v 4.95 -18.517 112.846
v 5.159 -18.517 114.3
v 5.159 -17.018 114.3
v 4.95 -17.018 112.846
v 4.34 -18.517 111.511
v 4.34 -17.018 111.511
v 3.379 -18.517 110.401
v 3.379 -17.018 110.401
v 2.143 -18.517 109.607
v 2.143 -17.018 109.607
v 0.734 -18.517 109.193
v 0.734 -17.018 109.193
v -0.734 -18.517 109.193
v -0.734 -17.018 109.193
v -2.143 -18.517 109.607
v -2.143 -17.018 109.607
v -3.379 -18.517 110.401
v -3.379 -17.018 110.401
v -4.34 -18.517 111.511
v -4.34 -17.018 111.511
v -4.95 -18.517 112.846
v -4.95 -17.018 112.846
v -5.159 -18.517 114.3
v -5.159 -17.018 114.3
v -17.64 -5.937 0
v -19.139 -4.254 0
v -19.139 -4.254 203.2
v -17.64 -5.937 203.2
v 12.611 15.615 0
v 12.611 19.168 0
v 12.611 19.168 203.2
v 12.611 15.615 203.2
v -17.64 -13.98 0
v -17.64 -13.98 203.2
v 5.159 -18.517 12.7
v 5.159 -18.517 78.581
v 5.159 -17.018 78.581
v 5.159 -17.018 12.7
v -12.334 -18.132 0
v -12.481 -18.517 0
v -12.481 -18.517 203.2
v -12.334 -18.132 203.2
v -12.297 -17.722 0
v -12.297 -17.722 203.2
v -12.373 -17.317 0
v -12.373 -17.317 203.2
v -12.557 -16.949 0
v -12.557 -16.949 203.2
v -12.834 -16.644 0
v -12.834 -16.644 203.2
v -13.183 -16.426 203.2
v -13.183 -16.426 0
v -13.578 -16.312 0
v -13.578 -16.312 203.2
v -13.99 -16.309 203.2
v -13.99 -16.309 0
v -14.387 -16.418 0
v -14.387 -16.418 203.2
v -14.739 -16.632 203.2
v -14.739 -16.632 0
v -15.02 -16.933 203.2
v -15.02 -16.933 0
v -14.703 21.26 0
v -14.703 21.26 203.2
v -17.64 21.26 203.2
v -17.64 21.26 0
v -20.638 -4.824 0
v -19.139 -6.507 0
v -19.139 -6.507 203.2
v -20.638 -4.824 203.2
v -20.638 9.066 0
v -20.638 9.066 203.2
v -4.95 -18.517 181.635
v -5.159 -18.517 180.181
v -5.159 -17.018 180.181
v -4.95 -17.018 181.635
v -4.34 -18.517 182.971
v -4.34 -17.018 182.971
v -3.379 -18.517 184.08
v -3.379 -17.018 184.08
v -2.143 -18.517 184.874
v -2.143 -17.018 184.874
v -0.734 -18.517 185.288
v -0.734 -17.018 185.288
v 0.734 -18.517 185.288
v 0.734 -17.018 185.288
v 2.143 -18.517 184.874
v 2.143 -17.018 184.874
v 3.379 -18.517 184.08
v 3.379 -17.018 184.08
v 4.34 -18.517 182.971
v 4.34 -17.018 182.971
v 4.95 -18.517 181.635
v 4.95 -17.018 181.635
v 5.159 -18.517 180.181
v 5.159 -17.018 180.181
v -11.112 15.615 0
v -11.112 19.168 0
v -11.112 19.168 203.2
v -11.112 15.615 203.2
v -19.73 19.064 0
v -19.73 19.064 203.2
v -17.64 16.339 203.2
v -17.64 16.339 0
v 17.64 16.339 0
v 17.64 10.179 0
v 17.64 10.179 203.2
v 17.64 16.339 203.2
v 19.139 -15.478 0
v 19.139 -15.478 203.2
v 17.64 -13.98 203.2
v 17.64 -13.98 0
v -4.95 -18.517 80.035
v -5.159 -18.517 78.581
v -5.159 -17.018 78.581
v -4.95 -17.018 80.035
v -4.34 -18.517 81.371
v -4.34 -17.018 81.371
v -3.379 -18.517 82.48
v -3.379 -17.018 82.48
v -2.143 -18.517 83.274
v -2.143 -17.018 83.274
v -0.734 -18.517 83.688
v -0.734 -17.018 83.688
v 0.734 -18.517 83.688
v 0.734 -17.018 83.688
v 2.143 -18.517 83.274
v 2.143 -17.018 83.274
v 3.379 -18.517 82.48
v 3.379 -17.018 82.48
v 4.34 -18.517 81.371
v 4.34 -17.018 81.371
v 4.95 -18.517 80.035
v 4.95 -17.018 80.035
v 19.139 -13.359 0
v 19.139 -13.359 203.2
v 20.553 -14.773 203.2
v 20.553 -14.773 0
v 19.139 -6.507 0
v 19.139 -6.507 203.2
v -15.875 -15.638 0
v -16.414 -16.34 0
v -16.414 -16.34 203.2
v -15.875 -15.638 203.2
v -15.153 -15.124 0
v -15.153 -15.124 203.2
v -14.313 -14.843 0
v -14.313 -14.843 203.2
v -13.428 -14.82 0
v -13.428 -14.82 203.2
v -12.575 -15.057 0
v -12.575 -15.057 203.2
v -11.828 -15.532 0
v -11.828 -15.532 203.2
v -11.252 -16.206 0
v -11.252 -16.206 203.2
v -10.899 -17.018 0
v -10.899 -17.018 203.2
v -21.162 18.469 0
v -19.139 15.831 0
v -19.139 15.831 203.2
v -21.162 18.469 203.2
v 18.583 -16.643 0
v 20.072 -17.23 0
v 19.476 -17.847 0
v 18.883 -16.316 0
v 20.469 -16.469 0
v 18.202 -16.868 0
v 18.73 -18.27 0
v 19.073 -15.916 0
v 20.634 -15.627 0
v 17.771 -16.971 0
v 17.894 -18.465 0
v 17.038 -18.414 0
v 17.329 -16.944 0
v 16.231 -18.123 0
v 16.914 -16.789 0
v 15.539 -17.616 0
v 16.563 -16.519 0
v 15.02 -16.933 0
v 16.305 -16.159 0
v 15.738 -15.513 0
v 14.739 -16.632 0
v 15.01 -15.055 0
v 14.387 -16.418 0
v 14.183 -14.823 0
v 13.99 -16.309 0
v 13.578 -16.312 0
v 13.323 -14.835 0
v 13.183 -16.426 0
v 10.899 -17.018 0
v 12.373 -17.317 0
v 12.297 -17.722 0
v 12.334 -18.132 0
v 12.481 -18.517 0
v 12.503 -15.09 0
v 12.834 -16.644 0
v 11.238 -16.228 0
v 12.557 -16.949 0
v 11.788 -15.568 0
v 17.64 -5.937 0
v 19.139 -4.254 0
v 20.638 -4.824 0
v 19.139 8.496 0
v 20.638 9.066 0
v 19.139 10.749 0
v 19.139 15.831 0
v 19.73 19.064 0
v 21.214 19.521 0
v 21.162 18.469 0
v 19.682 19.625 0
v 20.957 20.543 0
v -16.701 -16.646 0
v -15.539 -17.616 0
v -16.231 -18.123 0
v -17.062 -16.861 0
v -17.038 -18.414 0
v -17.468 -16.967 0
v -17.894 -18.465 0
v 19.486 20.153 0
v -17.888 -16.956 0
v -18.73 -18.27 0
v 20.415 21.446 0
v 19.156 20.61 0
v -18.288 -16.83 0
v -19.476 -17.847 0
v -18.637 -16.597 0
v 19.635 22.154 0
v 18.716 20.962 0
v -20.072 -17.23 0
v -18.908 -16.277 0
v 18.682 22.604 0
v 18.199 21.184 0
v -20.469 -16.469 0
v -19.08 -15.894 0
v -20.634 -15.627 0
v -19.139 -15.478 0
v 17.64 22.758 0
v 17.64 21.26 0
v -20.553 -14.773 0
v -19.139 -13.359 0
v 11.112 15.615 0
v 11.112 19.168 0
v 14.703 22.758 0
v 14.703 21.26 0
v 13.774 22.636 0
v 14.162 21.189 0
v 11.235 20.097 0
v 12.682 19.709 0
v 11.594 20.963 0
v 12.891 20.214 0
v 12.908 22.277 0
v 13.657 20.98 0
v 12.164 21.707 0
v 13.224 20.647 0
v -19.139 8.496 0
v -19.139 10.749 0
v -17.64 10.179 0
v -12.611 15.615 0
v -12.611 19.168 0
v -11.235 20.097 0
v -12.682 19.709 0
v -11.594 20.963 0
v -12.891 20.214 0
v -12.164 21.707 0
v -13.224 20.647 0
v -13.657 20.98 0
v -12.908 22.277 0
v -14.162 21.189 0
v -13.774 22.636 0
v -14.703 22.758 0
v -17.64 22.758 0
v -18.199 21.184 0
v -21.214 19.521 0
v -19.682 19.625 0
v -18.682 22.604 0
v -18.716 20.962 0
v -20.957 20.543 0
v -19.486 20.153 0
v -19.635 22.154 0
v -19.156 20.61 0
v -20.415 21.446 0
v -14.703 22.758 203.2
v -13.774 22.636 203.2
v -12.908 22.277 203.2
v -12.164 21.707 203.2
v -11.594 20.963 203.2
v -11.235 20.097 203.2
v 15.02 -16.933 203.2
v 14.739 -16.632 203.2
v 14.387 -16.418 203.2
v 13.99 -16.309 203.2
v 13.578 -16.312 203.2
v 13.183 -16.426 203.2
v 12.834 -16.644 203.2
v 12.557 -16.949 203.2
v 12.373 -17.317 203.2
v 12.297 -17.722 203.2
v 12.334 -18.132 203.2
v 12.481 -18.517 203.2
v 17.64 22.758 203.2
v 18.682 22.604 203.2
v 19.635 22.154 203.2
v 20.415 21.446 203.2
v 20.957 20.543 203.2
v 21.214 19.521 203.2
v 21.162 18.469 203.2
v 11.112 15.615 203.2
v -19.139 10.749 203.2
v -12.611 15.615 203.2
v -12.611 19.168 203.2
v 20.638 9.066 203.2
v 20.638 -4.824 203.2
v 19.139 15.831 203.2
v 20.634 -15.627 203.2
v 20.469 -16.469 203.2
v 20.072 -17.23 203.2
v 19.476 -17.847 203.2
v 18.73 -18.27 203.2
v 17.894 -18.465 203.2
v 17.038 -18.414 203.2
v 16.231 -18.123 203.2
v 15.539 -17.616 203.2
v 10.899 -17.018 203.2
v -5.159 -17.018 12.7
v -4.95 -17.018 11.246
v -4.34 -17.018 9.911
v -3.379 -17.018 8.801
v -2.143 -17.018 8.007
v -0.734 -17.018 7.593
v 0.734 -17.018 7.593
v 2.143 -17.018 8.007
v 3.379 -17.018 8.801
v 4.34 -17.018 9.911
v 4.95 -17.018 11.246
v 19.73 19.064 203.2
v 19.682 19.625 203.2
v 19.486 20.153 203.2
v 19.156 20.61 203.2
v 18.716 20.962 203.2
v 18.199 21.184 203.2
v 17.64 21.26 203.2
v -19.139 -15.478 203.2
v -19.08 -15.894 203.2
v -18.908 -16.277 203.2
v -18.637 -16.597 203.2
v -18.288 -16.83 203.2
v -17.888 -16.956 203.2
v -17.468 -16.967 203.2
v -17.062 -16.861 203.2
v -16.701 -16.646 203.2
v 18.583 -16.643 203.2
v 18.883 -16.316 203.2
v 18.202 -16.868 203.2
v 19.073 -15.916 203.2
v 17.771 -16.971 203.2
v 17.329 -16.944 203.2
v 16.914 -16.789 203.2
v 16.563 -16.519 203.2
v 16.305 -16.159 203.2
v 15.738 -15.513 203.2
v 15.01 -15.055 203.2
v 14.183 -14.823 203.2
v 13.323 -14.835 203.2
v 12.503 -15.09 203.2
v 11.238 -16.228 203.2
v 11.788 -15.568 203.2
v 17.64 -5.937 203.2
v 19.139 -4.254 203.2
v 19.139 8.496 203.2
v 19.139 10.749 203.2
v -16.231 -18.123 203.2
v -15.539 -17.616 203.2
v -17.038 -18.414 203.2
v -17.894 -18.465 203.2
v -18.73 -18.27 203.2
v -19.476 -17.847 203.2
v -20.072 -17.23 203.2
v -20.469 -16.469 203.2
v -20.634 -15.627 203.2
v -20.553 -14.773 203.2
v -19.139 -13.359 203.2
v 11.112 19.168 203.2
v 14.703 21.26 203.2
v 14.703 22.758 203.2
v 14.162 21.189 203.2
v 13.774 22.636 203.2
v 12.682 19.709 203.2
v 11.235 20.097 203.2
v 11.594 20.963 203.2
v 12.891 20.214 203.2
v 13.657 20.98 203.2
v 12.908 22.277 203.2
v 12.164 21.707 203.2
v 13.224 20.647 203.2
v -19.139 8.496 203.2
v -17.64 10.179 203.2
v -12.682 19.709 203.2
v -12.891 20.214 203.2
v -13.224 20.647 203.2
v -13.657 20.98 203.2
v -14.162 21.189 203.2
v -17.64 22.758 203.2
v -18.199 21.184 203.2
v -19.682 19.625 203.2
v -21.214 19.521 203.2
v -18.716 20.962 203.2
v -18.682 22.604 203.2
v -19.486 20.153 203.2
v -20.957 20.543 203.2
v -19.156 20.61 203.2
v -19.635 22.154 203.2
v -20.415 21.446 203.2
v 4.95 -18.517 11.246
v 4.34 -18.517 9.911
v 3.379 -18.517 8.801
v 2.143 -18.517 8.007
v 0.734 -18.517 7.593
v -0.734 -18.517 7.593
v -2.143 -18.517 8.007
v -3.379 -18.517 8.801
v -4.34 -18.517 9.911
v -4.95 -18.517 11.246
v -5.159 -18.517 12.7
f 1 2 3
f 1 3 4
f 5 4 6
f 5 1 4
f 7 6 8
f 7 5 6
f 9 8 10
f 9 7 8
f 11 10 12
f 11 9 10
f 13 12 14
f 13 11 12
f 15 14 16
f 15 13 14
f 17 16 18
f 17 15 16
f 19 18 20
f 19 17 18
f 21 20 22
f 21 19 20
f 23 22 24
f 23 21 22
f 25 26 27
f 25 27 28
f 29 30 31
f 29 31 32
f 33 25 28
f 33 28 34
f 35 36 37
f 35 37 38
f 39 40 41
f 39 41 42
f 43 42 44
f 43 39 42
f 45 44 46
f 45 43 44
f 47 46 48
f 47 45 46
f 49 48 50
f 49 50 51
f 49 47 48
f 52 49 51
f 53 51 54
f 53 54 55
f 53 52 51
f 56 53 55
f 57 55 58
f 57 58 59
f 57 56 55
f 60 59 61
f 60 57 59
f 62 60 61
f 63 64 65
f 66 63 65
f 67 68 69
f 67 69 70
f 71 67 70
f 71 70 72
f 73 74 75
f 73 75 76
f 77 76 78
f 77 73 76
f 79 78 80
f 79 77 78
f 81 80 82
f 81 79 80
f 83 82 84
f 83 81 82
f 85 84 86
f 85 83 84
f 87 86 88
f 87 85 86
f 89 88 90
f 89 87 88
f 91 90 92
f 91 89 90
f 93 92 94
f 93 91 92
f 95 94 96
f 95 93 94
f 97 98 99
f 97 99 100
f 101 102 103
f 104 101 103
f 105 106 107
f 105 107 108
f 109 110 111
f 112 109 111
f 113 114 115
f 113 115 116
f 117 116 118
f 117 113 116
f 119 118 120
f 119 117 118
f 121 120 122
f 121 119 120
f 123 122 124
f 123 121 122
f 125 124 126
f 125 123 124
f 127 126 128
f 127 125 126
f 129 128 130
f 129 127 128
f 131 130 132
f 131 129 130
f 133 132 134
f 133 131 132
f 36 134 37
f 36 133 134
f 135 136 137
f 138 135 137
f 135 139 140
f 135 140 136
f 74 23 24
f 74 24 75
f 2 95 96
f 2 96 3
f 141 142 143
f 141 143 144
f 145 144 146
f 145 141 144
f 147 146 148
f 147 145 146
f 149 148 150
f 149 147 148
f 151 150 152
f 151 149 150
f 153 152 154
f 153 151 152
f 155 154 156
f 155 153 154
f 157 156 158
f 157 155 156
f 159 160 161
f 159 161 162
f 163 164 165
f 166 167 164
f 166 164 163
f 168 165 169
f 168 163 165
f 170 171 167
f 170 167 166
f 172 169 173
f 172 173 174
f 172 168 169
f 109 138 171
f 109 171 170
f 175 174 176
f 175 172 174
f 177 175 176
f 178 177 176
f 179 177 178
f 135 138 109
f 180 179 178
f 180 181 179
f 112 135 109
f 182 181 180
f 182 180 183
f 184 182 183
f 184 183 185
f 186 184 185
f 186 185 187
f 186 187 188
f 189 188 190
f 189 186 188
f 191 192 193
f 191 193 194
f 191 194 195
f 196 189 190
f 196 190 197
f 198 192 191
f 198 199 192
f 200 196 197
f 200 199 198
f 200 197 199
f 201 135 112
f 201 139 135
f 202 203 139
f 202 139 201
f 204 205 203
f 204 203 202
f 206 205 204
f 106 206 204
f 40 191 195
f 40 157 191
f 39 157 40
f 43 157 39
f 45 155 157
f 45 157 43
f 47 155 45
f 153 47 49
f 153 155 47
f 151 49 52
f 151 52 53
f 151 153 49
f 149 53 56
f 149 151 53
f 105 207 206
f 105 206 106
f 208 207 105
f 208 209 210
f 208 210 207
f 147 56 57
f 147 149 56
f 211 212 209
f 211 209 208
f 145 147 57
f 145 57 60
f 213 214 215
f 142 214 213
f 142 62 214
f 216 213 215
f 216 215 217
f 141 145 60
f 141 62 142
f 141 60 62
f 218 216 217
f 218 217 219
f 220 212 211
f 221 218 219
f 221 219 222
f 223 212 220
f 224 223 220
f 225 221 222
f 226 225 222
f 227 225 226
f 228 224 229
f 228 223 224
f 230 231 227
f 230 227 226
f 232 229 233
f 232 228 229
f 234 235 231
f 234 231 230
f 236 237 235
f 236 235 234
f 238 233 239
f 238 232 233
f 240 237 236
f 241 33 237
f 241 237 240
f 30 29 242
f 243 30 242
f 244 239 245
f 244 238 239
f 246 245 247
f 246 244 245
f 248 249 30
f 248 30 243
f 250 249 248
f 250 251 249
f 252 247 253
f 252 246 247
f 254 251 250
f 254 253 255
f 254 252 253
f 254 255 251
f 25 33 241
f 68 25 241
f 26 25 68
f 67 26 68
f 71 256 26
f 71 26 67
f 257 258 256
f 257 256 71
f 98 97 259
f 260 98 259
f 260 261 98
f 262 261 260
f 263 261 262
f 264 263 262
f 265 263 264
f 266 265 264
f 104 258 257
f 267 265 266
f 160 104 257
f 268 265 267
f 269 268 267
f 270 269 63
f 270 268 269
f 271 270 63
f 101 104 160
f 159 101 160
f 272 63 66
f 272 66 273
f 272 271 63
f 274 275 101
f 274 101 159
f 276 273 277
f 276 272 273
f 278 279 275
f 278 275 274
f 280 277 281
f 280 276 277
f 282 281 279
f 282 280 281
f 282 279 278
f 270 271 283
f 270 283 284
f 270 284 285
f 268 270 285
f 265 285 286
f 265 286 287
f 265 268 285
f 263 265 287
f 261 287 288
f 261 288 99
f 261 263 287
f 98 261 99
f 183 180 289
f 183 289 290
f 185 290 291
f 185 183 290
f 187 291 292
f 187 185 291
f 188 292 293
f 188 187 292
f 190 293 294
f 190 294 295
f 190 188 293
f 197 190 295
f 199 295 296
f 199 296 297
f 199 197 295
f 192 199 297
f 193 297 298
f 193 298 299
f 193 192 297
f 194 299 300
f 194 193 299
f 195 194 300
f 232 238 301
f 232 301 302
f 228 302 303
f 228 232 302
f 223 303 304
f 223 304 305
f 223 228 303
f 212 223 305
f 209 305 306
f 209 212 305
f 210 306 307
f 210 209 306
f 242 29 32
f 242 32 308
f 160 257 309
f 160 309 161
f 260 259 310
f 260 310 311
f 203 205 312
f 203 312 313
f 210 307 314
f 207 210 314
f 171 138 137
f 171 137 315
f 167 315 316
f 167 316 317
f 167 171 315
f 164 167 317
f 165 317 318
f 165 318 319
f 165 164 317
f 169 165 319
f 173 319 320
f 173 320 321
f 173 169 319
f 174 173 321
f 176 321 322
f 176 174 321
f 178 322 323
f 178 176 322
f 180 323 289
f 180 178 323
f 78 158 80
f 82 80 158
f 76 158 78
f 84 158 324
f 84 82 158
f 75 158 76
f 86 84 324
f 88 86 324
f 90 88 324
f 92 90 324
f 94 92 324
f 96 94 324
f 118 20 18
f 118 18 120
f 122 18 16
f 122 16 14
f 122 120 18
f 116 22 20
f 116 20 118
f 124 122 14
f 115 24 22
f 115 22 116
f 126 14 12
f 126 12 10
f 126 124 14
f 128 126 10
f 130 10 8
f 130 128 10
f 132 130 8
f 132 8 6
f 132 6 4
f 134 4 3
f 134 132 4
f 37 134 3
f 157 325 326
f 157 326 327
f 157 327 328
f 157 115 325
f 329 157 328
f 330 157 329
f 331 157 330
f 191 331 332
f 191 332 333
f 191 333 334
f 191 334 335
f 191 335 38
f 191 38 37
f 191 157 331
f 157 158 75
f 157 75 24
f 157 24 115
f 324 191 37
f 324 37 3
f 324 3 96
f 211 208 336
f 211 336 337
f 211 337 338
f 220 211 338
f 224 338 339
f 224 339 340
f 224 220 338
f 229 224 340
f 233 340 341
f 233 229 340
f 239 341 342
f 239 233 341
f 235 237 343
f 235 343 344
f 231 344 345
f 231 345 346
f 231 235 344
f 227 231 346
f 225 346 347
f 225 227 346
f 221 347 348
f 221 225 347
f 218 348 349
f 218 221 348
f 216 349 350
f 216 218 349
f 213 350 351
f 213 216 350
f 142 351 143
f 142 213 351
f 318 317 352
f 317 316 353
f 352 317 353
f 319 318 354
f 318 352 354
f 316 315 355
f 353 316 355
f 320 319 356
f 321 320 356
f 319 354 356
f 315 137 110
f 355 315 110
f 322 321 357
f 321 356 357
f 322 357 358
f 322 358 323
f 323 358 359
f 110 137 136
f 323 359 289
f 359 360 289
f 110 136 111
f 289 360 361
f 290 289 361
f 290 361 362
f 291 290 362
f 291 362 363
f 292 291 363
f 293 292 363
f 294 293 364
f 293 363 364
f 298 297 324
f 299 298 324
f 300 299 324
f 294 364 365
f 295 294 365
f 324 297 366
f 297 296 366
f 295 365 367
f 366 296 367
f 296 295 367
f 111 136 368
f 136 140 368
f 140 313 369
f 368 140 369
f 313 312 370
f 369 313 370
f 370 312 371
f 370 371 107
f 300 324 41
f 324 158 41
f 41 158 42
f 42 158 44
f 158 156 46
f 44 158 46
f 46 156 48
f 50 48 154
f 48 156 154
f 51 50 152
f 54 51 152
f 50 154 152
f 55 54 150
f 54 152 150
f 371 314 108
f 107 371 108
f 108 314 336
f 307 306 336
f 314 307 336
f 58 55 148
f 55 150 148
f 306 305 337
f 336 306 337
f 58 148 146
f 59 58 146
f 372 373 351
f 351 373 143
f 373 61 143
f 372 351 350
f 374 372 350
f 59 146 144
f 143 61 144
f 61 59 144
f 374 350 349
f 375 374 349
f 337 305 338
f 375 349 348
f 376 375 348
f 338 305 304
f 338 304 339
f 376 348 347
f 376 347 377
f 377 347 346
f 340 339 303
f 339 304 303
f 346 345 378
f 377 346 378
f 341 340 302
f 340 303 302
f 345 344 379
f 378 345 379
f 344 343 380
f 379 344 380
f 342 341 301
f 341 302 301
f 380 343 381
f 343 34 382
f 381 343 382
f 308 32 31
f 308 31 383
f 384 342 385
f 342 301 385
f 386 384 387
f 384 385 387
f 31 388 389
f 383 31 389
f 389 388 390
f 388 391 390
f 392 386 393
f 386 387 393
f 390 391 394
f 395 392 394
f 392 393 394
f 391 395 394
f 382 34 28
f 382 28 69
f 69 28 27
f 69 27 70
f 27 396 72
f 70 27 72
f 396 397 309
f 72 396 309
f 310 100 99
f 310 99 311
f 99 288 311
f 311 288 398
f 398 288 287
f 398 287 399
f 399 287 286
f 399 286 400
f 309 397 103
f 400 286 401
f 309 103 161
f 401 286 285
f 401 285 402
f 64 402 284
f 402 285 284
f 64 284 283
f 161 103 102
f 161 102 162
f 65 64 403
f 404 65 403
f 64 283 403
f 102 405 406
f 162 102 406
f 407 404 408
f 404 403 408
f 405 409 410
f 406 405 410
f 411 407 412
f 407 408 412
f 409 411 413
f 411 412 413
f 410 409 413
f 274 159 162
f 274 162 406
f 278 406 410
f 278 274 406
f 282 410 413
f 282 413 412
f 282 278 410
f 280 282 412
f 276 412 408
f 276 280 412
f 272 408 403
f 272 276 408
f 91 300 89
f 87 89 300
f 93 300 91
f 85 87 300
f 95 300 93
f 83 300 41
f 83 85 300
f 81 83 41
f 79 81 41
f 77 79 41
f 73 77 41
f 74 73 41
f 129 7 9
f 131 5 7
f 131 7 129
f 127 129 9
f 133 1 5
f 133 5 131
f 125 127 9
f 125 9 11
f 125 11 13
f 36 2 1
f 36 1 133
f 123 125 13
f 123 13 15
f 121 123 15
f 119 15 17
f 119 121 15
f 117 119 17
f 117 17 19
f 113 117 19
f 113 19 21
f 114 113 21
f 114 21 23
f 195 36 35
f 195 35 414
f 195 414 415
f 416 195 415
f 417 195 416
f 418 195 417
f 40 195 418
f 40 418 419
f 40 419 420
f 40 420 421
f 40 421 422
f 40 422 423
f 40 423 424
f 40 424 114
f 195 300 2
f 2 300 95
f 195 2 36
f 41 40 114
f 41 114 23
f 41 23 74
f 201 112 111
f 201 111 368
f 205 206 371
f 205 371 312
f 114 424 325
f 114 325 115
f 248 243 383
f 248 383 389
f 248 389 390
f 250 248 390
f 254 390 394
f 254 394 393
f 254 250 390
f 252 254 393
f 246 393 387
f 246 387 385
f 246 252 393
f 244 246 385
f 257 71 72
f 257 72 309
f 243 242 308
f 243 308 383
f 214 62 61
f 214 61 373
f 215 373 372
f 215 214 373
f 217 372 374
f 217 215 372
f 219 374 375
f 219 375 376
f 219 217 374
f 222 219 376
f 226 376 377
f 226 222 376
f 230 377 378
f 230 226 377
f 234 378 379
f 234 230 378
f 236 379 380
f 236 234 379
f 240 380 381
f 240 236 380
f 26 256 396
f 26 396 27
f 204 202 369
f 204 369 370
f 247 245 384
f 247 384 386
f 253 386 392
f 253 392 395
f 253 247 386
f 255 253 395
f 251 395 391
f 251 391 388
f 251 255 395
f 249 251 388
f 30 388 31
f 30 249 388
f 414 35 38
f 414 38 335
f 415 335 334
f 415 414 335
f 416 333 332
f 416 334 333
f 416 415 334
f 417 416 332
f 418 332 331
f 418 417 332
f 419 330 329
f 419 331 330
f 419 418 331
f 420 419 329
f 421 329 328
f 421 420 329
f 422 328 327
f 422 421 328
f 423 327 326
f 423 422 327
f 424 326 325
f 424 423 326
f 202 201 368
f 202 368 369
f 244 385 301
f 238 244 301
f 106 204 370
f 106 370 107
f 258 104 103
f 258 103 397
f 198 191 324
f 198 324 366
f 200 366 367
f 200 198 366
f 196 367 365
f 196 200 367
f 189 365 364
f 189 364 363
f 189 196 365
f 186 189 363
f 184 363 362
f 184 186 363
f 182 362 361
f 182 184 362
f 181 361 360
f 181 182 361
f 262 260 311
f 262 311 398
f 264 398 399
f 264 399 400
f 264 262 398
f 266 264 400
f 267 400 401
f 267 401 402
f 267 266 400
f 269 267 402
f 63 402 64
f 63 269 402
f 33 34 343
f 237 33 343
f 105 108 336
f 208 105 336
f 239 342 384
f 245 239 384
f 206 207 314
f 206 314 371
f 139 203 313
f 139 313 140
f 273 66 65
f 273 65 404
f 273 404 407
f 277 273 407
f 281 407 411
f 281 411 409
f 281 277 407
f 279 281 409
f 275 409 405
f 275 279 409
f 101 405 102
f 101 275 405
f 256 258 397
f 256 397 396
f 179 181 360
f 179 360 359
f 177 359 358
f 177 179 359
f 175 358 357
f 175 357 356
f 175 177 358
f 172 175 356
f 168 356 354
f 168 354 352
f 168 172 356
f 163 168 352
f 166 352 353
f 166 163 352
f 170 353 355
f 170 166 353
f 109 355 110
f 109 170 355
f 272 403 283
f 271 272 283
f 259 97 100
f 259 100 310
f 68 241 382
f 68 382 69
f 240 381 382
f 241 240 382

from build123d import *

# Parameters (mm, degrees)
BASE_EXTRUDE_DEPTH = 203.2
LSLOT_DEPTH        = 225.525158509
LPATTERN1_COUNT    = 2
LPATTERN1_PITCH    = 101.6


with BuildPart() as part:
    # Sketch1 → Base-Extrude (new body)
    with BuildSketch(Plane.XY):
        with BuildLine():
            Line((17.6403, 16.339286512), (19.729882578, 19.063533504))
            ThreePointArc((19.729882578, 19.063533504), (19.156045845, 20.609744632), (17.6403, 21.2598))
            Line((17.6403, 21.2598), (14.70327367, 21.2598))
            ThreePointArc((14.70327367, 21.2598), (13.223883481, 20.647016519), (12.6111, 19.16762633))
            Line((12.6111, 19.16762633), (12.6111, 15.61465))
            Line((12.6111, 15.61465), (11.1125, 15.61465))
            Line((11.1125, 15.61465), (11.1125, 19.16762633))
            ThreePointArc((11.1125, 19.16762633), (12.164213258, 21.706686742), (14.70327367, 22.7584))
            Line((14.70327367, 22.7584), (17.6403, 22.7584))
            ThreePointArc((17.6403, 22.7584), (20.415434554, 21.446284653), (21.162428673, 18.4688666))
            Line((21.162428673, 18.4688666), (19.1389, 15.830735923))
            Line((19.1389, 15.830735923), (19.1389, 10.749129415))
            Line((19.1389, 10.749129415), (20.6375, 9.0662125))
            Line((20.6375, 9.0662125), (20.6375, -4.8244125))
            Line((20.6375, -4.8244125), (19.1389, -6.507329415))
            Line((19.1389, -6.507329415), (19.1389, -13.358784555))
            Line((19.1389, -13.358784555), (20.553458003, -14.773342558))
            ThreePointArc((20.553458003, -14.773342558), (18.729942105, -18.270236732), (15.019825564, -16.932883251))
            ThreePointArc((15.019825564, -16.932883251), (13.000752562, -16.523120627), (12.480559153, -18.5166))
            Line((12.480559153, -18.5166), (-12.480559153, -18.5166))
            ThreePointArc((-12.480559153, -18.5166), (-13.000752562, -16.523120627), (-15.019825564, -16.932883251))
            ThreePointArc((-15.019825564, -16.932883251), (-18.729942105, -18.270236732), (-20.553458003, -14.773342558))
            Line((-20.553458003, -14.773342558), (-19.1389, -13.358784555))
            Line((-19.1389, -13.358784555), (-19.1389, -6.507329415))
            Line((-19.1389, -6.507329415), (-20.6375, -4.8244125))
            Line((-20.6375, -4.8244125), (-20.6375, 9.0662125))
            Line((-20.6375, 9.0662125), (-19.1389, 10.749129415))
            Line((-19.1389, 10.749129415), (-19.1389, 15.830735923))
            Line((-19.1389, 15.830735923), (-21.162428673, 18.4688666))
            ThreePointArc((-21.162428673, 18.4688666), (-20.415434554, 21.446284653), (-17.6403, 22.7584))
            Line((-17.6403, 22.7584), (-14.70327367, 22.7584))
            ThreePointArc((-14.70327367, 22.7584), (-12.164213258, 21.706686742), (-11.1125, 19.16762633))
            Line((-11.1125, 19.16762633), (-11.1125, 15.61465))
            Line((-11.1125, 15.61465), (-12.6111, 15.61465))
            Line((-12.6111, 15.61465), (-12.6111, 19.16762633))
            ThreePointArc((-12.6111, 19.16762633), (-13.223883481, 20.647016519), (-14.70327367, 21.2598))
            Line((-14.70327367, 21.2598), (-17.6403, 21.2598))
            ThreePointArc((-17.6403, 21.2598), (-19.156045845, 20.609744632), (-19.729882578, 19.063533504))
            Line((-19.729882578, 19.063533504), (-17.6403, 16.339286512))
            Line((-17.6403, 16.339286512), (-17.6403, 10.17860201))
            Line((-17.6403, 10.17860201), (-19.1389, 8.495685095))
            Line((-19.1389, 8.495685095), (-19.1389, -4.253885095))
            Line((-19.1389, -4.253885095), (-17.6403, -5.93680201))
            Line((-17.6403, -5.93680201), (-17.6403, -13.979525))
            Line((-17.6403, -13.979525), (-19.1389, -15.478125))
            ThreePointArc((-19.1389, -15.478125), (-18.092238669, -16.906954381), (-16.414285827, -16.33992034))
            ThreePointArc((-16.414285827, -16.33992034), (-13.428073412, -14.819877156), (-10.898992189, -17.018))
            Line((-10.898992189, -17.018), (10.898992189, -17.018))
            ThreePointArc((10.898992189, -17.018), (13.323359075, -14.834630878), (16.30518861, -16.15877141))
            ThreePointArc((16.30518861, -16.15877141), (17.990302879, -16.935279743), (19.1389, -15.478125))
            Line((19.1389, -15.478125), (17.6403, -13.979525))
            Line((17.6403, -13.979525), (17.6403, -5.93680201))
            Line((17.6403, -5.93680201), (19.1389, -4.253885095))
            Line((19.1389, -4.253885095), (19.1389, 8.495685095))
            Line((19.1389, 8.495685095), (17.6403, 10.17860201))
            Line((17.6403, 10.17860201), (17.6403, 16.339286512))
        make_face()
    extrude(amount=BASE_EXTRUDE_DEPTH)

    # Sketch2 → LSlot (cut, through all)
    with BuildSketch(Plane(origin=(-0.093451067, -18.5166, -16.466077999), x_dir=(1, 0, 0), z_dir=(0, -1, 0))):
        with BuildLine():
            Line((5.252826067, 95.047327999), (5.252826067, 29.166077999))
            ThreePointArc((5.252826067, 29.166077999), (0.093451067, 24.006702999), (-5.065923933, 29.166077999))
            Line((-5.065923933, 29.166077999), (-5.065923933, 95.047327999))
            ThreePointArc((-5.065923933, 95.047327999), (0.093451067, 100.206702999), (5.252826067, 95.047327999))
        make_face()
    lslot = extrude(amount=-LSLOT_DEPTH, mode=Mode.SUBTRACT)

    # LPattern1: LSlot ×2
    with Locations(*[(0, 0, i * LPATTERN1_PITCH) for i in range(1, LPATTERN1_COUNT)]):
        add(lslot, mode=Mode.SUBTRACT)


solid = part.part
